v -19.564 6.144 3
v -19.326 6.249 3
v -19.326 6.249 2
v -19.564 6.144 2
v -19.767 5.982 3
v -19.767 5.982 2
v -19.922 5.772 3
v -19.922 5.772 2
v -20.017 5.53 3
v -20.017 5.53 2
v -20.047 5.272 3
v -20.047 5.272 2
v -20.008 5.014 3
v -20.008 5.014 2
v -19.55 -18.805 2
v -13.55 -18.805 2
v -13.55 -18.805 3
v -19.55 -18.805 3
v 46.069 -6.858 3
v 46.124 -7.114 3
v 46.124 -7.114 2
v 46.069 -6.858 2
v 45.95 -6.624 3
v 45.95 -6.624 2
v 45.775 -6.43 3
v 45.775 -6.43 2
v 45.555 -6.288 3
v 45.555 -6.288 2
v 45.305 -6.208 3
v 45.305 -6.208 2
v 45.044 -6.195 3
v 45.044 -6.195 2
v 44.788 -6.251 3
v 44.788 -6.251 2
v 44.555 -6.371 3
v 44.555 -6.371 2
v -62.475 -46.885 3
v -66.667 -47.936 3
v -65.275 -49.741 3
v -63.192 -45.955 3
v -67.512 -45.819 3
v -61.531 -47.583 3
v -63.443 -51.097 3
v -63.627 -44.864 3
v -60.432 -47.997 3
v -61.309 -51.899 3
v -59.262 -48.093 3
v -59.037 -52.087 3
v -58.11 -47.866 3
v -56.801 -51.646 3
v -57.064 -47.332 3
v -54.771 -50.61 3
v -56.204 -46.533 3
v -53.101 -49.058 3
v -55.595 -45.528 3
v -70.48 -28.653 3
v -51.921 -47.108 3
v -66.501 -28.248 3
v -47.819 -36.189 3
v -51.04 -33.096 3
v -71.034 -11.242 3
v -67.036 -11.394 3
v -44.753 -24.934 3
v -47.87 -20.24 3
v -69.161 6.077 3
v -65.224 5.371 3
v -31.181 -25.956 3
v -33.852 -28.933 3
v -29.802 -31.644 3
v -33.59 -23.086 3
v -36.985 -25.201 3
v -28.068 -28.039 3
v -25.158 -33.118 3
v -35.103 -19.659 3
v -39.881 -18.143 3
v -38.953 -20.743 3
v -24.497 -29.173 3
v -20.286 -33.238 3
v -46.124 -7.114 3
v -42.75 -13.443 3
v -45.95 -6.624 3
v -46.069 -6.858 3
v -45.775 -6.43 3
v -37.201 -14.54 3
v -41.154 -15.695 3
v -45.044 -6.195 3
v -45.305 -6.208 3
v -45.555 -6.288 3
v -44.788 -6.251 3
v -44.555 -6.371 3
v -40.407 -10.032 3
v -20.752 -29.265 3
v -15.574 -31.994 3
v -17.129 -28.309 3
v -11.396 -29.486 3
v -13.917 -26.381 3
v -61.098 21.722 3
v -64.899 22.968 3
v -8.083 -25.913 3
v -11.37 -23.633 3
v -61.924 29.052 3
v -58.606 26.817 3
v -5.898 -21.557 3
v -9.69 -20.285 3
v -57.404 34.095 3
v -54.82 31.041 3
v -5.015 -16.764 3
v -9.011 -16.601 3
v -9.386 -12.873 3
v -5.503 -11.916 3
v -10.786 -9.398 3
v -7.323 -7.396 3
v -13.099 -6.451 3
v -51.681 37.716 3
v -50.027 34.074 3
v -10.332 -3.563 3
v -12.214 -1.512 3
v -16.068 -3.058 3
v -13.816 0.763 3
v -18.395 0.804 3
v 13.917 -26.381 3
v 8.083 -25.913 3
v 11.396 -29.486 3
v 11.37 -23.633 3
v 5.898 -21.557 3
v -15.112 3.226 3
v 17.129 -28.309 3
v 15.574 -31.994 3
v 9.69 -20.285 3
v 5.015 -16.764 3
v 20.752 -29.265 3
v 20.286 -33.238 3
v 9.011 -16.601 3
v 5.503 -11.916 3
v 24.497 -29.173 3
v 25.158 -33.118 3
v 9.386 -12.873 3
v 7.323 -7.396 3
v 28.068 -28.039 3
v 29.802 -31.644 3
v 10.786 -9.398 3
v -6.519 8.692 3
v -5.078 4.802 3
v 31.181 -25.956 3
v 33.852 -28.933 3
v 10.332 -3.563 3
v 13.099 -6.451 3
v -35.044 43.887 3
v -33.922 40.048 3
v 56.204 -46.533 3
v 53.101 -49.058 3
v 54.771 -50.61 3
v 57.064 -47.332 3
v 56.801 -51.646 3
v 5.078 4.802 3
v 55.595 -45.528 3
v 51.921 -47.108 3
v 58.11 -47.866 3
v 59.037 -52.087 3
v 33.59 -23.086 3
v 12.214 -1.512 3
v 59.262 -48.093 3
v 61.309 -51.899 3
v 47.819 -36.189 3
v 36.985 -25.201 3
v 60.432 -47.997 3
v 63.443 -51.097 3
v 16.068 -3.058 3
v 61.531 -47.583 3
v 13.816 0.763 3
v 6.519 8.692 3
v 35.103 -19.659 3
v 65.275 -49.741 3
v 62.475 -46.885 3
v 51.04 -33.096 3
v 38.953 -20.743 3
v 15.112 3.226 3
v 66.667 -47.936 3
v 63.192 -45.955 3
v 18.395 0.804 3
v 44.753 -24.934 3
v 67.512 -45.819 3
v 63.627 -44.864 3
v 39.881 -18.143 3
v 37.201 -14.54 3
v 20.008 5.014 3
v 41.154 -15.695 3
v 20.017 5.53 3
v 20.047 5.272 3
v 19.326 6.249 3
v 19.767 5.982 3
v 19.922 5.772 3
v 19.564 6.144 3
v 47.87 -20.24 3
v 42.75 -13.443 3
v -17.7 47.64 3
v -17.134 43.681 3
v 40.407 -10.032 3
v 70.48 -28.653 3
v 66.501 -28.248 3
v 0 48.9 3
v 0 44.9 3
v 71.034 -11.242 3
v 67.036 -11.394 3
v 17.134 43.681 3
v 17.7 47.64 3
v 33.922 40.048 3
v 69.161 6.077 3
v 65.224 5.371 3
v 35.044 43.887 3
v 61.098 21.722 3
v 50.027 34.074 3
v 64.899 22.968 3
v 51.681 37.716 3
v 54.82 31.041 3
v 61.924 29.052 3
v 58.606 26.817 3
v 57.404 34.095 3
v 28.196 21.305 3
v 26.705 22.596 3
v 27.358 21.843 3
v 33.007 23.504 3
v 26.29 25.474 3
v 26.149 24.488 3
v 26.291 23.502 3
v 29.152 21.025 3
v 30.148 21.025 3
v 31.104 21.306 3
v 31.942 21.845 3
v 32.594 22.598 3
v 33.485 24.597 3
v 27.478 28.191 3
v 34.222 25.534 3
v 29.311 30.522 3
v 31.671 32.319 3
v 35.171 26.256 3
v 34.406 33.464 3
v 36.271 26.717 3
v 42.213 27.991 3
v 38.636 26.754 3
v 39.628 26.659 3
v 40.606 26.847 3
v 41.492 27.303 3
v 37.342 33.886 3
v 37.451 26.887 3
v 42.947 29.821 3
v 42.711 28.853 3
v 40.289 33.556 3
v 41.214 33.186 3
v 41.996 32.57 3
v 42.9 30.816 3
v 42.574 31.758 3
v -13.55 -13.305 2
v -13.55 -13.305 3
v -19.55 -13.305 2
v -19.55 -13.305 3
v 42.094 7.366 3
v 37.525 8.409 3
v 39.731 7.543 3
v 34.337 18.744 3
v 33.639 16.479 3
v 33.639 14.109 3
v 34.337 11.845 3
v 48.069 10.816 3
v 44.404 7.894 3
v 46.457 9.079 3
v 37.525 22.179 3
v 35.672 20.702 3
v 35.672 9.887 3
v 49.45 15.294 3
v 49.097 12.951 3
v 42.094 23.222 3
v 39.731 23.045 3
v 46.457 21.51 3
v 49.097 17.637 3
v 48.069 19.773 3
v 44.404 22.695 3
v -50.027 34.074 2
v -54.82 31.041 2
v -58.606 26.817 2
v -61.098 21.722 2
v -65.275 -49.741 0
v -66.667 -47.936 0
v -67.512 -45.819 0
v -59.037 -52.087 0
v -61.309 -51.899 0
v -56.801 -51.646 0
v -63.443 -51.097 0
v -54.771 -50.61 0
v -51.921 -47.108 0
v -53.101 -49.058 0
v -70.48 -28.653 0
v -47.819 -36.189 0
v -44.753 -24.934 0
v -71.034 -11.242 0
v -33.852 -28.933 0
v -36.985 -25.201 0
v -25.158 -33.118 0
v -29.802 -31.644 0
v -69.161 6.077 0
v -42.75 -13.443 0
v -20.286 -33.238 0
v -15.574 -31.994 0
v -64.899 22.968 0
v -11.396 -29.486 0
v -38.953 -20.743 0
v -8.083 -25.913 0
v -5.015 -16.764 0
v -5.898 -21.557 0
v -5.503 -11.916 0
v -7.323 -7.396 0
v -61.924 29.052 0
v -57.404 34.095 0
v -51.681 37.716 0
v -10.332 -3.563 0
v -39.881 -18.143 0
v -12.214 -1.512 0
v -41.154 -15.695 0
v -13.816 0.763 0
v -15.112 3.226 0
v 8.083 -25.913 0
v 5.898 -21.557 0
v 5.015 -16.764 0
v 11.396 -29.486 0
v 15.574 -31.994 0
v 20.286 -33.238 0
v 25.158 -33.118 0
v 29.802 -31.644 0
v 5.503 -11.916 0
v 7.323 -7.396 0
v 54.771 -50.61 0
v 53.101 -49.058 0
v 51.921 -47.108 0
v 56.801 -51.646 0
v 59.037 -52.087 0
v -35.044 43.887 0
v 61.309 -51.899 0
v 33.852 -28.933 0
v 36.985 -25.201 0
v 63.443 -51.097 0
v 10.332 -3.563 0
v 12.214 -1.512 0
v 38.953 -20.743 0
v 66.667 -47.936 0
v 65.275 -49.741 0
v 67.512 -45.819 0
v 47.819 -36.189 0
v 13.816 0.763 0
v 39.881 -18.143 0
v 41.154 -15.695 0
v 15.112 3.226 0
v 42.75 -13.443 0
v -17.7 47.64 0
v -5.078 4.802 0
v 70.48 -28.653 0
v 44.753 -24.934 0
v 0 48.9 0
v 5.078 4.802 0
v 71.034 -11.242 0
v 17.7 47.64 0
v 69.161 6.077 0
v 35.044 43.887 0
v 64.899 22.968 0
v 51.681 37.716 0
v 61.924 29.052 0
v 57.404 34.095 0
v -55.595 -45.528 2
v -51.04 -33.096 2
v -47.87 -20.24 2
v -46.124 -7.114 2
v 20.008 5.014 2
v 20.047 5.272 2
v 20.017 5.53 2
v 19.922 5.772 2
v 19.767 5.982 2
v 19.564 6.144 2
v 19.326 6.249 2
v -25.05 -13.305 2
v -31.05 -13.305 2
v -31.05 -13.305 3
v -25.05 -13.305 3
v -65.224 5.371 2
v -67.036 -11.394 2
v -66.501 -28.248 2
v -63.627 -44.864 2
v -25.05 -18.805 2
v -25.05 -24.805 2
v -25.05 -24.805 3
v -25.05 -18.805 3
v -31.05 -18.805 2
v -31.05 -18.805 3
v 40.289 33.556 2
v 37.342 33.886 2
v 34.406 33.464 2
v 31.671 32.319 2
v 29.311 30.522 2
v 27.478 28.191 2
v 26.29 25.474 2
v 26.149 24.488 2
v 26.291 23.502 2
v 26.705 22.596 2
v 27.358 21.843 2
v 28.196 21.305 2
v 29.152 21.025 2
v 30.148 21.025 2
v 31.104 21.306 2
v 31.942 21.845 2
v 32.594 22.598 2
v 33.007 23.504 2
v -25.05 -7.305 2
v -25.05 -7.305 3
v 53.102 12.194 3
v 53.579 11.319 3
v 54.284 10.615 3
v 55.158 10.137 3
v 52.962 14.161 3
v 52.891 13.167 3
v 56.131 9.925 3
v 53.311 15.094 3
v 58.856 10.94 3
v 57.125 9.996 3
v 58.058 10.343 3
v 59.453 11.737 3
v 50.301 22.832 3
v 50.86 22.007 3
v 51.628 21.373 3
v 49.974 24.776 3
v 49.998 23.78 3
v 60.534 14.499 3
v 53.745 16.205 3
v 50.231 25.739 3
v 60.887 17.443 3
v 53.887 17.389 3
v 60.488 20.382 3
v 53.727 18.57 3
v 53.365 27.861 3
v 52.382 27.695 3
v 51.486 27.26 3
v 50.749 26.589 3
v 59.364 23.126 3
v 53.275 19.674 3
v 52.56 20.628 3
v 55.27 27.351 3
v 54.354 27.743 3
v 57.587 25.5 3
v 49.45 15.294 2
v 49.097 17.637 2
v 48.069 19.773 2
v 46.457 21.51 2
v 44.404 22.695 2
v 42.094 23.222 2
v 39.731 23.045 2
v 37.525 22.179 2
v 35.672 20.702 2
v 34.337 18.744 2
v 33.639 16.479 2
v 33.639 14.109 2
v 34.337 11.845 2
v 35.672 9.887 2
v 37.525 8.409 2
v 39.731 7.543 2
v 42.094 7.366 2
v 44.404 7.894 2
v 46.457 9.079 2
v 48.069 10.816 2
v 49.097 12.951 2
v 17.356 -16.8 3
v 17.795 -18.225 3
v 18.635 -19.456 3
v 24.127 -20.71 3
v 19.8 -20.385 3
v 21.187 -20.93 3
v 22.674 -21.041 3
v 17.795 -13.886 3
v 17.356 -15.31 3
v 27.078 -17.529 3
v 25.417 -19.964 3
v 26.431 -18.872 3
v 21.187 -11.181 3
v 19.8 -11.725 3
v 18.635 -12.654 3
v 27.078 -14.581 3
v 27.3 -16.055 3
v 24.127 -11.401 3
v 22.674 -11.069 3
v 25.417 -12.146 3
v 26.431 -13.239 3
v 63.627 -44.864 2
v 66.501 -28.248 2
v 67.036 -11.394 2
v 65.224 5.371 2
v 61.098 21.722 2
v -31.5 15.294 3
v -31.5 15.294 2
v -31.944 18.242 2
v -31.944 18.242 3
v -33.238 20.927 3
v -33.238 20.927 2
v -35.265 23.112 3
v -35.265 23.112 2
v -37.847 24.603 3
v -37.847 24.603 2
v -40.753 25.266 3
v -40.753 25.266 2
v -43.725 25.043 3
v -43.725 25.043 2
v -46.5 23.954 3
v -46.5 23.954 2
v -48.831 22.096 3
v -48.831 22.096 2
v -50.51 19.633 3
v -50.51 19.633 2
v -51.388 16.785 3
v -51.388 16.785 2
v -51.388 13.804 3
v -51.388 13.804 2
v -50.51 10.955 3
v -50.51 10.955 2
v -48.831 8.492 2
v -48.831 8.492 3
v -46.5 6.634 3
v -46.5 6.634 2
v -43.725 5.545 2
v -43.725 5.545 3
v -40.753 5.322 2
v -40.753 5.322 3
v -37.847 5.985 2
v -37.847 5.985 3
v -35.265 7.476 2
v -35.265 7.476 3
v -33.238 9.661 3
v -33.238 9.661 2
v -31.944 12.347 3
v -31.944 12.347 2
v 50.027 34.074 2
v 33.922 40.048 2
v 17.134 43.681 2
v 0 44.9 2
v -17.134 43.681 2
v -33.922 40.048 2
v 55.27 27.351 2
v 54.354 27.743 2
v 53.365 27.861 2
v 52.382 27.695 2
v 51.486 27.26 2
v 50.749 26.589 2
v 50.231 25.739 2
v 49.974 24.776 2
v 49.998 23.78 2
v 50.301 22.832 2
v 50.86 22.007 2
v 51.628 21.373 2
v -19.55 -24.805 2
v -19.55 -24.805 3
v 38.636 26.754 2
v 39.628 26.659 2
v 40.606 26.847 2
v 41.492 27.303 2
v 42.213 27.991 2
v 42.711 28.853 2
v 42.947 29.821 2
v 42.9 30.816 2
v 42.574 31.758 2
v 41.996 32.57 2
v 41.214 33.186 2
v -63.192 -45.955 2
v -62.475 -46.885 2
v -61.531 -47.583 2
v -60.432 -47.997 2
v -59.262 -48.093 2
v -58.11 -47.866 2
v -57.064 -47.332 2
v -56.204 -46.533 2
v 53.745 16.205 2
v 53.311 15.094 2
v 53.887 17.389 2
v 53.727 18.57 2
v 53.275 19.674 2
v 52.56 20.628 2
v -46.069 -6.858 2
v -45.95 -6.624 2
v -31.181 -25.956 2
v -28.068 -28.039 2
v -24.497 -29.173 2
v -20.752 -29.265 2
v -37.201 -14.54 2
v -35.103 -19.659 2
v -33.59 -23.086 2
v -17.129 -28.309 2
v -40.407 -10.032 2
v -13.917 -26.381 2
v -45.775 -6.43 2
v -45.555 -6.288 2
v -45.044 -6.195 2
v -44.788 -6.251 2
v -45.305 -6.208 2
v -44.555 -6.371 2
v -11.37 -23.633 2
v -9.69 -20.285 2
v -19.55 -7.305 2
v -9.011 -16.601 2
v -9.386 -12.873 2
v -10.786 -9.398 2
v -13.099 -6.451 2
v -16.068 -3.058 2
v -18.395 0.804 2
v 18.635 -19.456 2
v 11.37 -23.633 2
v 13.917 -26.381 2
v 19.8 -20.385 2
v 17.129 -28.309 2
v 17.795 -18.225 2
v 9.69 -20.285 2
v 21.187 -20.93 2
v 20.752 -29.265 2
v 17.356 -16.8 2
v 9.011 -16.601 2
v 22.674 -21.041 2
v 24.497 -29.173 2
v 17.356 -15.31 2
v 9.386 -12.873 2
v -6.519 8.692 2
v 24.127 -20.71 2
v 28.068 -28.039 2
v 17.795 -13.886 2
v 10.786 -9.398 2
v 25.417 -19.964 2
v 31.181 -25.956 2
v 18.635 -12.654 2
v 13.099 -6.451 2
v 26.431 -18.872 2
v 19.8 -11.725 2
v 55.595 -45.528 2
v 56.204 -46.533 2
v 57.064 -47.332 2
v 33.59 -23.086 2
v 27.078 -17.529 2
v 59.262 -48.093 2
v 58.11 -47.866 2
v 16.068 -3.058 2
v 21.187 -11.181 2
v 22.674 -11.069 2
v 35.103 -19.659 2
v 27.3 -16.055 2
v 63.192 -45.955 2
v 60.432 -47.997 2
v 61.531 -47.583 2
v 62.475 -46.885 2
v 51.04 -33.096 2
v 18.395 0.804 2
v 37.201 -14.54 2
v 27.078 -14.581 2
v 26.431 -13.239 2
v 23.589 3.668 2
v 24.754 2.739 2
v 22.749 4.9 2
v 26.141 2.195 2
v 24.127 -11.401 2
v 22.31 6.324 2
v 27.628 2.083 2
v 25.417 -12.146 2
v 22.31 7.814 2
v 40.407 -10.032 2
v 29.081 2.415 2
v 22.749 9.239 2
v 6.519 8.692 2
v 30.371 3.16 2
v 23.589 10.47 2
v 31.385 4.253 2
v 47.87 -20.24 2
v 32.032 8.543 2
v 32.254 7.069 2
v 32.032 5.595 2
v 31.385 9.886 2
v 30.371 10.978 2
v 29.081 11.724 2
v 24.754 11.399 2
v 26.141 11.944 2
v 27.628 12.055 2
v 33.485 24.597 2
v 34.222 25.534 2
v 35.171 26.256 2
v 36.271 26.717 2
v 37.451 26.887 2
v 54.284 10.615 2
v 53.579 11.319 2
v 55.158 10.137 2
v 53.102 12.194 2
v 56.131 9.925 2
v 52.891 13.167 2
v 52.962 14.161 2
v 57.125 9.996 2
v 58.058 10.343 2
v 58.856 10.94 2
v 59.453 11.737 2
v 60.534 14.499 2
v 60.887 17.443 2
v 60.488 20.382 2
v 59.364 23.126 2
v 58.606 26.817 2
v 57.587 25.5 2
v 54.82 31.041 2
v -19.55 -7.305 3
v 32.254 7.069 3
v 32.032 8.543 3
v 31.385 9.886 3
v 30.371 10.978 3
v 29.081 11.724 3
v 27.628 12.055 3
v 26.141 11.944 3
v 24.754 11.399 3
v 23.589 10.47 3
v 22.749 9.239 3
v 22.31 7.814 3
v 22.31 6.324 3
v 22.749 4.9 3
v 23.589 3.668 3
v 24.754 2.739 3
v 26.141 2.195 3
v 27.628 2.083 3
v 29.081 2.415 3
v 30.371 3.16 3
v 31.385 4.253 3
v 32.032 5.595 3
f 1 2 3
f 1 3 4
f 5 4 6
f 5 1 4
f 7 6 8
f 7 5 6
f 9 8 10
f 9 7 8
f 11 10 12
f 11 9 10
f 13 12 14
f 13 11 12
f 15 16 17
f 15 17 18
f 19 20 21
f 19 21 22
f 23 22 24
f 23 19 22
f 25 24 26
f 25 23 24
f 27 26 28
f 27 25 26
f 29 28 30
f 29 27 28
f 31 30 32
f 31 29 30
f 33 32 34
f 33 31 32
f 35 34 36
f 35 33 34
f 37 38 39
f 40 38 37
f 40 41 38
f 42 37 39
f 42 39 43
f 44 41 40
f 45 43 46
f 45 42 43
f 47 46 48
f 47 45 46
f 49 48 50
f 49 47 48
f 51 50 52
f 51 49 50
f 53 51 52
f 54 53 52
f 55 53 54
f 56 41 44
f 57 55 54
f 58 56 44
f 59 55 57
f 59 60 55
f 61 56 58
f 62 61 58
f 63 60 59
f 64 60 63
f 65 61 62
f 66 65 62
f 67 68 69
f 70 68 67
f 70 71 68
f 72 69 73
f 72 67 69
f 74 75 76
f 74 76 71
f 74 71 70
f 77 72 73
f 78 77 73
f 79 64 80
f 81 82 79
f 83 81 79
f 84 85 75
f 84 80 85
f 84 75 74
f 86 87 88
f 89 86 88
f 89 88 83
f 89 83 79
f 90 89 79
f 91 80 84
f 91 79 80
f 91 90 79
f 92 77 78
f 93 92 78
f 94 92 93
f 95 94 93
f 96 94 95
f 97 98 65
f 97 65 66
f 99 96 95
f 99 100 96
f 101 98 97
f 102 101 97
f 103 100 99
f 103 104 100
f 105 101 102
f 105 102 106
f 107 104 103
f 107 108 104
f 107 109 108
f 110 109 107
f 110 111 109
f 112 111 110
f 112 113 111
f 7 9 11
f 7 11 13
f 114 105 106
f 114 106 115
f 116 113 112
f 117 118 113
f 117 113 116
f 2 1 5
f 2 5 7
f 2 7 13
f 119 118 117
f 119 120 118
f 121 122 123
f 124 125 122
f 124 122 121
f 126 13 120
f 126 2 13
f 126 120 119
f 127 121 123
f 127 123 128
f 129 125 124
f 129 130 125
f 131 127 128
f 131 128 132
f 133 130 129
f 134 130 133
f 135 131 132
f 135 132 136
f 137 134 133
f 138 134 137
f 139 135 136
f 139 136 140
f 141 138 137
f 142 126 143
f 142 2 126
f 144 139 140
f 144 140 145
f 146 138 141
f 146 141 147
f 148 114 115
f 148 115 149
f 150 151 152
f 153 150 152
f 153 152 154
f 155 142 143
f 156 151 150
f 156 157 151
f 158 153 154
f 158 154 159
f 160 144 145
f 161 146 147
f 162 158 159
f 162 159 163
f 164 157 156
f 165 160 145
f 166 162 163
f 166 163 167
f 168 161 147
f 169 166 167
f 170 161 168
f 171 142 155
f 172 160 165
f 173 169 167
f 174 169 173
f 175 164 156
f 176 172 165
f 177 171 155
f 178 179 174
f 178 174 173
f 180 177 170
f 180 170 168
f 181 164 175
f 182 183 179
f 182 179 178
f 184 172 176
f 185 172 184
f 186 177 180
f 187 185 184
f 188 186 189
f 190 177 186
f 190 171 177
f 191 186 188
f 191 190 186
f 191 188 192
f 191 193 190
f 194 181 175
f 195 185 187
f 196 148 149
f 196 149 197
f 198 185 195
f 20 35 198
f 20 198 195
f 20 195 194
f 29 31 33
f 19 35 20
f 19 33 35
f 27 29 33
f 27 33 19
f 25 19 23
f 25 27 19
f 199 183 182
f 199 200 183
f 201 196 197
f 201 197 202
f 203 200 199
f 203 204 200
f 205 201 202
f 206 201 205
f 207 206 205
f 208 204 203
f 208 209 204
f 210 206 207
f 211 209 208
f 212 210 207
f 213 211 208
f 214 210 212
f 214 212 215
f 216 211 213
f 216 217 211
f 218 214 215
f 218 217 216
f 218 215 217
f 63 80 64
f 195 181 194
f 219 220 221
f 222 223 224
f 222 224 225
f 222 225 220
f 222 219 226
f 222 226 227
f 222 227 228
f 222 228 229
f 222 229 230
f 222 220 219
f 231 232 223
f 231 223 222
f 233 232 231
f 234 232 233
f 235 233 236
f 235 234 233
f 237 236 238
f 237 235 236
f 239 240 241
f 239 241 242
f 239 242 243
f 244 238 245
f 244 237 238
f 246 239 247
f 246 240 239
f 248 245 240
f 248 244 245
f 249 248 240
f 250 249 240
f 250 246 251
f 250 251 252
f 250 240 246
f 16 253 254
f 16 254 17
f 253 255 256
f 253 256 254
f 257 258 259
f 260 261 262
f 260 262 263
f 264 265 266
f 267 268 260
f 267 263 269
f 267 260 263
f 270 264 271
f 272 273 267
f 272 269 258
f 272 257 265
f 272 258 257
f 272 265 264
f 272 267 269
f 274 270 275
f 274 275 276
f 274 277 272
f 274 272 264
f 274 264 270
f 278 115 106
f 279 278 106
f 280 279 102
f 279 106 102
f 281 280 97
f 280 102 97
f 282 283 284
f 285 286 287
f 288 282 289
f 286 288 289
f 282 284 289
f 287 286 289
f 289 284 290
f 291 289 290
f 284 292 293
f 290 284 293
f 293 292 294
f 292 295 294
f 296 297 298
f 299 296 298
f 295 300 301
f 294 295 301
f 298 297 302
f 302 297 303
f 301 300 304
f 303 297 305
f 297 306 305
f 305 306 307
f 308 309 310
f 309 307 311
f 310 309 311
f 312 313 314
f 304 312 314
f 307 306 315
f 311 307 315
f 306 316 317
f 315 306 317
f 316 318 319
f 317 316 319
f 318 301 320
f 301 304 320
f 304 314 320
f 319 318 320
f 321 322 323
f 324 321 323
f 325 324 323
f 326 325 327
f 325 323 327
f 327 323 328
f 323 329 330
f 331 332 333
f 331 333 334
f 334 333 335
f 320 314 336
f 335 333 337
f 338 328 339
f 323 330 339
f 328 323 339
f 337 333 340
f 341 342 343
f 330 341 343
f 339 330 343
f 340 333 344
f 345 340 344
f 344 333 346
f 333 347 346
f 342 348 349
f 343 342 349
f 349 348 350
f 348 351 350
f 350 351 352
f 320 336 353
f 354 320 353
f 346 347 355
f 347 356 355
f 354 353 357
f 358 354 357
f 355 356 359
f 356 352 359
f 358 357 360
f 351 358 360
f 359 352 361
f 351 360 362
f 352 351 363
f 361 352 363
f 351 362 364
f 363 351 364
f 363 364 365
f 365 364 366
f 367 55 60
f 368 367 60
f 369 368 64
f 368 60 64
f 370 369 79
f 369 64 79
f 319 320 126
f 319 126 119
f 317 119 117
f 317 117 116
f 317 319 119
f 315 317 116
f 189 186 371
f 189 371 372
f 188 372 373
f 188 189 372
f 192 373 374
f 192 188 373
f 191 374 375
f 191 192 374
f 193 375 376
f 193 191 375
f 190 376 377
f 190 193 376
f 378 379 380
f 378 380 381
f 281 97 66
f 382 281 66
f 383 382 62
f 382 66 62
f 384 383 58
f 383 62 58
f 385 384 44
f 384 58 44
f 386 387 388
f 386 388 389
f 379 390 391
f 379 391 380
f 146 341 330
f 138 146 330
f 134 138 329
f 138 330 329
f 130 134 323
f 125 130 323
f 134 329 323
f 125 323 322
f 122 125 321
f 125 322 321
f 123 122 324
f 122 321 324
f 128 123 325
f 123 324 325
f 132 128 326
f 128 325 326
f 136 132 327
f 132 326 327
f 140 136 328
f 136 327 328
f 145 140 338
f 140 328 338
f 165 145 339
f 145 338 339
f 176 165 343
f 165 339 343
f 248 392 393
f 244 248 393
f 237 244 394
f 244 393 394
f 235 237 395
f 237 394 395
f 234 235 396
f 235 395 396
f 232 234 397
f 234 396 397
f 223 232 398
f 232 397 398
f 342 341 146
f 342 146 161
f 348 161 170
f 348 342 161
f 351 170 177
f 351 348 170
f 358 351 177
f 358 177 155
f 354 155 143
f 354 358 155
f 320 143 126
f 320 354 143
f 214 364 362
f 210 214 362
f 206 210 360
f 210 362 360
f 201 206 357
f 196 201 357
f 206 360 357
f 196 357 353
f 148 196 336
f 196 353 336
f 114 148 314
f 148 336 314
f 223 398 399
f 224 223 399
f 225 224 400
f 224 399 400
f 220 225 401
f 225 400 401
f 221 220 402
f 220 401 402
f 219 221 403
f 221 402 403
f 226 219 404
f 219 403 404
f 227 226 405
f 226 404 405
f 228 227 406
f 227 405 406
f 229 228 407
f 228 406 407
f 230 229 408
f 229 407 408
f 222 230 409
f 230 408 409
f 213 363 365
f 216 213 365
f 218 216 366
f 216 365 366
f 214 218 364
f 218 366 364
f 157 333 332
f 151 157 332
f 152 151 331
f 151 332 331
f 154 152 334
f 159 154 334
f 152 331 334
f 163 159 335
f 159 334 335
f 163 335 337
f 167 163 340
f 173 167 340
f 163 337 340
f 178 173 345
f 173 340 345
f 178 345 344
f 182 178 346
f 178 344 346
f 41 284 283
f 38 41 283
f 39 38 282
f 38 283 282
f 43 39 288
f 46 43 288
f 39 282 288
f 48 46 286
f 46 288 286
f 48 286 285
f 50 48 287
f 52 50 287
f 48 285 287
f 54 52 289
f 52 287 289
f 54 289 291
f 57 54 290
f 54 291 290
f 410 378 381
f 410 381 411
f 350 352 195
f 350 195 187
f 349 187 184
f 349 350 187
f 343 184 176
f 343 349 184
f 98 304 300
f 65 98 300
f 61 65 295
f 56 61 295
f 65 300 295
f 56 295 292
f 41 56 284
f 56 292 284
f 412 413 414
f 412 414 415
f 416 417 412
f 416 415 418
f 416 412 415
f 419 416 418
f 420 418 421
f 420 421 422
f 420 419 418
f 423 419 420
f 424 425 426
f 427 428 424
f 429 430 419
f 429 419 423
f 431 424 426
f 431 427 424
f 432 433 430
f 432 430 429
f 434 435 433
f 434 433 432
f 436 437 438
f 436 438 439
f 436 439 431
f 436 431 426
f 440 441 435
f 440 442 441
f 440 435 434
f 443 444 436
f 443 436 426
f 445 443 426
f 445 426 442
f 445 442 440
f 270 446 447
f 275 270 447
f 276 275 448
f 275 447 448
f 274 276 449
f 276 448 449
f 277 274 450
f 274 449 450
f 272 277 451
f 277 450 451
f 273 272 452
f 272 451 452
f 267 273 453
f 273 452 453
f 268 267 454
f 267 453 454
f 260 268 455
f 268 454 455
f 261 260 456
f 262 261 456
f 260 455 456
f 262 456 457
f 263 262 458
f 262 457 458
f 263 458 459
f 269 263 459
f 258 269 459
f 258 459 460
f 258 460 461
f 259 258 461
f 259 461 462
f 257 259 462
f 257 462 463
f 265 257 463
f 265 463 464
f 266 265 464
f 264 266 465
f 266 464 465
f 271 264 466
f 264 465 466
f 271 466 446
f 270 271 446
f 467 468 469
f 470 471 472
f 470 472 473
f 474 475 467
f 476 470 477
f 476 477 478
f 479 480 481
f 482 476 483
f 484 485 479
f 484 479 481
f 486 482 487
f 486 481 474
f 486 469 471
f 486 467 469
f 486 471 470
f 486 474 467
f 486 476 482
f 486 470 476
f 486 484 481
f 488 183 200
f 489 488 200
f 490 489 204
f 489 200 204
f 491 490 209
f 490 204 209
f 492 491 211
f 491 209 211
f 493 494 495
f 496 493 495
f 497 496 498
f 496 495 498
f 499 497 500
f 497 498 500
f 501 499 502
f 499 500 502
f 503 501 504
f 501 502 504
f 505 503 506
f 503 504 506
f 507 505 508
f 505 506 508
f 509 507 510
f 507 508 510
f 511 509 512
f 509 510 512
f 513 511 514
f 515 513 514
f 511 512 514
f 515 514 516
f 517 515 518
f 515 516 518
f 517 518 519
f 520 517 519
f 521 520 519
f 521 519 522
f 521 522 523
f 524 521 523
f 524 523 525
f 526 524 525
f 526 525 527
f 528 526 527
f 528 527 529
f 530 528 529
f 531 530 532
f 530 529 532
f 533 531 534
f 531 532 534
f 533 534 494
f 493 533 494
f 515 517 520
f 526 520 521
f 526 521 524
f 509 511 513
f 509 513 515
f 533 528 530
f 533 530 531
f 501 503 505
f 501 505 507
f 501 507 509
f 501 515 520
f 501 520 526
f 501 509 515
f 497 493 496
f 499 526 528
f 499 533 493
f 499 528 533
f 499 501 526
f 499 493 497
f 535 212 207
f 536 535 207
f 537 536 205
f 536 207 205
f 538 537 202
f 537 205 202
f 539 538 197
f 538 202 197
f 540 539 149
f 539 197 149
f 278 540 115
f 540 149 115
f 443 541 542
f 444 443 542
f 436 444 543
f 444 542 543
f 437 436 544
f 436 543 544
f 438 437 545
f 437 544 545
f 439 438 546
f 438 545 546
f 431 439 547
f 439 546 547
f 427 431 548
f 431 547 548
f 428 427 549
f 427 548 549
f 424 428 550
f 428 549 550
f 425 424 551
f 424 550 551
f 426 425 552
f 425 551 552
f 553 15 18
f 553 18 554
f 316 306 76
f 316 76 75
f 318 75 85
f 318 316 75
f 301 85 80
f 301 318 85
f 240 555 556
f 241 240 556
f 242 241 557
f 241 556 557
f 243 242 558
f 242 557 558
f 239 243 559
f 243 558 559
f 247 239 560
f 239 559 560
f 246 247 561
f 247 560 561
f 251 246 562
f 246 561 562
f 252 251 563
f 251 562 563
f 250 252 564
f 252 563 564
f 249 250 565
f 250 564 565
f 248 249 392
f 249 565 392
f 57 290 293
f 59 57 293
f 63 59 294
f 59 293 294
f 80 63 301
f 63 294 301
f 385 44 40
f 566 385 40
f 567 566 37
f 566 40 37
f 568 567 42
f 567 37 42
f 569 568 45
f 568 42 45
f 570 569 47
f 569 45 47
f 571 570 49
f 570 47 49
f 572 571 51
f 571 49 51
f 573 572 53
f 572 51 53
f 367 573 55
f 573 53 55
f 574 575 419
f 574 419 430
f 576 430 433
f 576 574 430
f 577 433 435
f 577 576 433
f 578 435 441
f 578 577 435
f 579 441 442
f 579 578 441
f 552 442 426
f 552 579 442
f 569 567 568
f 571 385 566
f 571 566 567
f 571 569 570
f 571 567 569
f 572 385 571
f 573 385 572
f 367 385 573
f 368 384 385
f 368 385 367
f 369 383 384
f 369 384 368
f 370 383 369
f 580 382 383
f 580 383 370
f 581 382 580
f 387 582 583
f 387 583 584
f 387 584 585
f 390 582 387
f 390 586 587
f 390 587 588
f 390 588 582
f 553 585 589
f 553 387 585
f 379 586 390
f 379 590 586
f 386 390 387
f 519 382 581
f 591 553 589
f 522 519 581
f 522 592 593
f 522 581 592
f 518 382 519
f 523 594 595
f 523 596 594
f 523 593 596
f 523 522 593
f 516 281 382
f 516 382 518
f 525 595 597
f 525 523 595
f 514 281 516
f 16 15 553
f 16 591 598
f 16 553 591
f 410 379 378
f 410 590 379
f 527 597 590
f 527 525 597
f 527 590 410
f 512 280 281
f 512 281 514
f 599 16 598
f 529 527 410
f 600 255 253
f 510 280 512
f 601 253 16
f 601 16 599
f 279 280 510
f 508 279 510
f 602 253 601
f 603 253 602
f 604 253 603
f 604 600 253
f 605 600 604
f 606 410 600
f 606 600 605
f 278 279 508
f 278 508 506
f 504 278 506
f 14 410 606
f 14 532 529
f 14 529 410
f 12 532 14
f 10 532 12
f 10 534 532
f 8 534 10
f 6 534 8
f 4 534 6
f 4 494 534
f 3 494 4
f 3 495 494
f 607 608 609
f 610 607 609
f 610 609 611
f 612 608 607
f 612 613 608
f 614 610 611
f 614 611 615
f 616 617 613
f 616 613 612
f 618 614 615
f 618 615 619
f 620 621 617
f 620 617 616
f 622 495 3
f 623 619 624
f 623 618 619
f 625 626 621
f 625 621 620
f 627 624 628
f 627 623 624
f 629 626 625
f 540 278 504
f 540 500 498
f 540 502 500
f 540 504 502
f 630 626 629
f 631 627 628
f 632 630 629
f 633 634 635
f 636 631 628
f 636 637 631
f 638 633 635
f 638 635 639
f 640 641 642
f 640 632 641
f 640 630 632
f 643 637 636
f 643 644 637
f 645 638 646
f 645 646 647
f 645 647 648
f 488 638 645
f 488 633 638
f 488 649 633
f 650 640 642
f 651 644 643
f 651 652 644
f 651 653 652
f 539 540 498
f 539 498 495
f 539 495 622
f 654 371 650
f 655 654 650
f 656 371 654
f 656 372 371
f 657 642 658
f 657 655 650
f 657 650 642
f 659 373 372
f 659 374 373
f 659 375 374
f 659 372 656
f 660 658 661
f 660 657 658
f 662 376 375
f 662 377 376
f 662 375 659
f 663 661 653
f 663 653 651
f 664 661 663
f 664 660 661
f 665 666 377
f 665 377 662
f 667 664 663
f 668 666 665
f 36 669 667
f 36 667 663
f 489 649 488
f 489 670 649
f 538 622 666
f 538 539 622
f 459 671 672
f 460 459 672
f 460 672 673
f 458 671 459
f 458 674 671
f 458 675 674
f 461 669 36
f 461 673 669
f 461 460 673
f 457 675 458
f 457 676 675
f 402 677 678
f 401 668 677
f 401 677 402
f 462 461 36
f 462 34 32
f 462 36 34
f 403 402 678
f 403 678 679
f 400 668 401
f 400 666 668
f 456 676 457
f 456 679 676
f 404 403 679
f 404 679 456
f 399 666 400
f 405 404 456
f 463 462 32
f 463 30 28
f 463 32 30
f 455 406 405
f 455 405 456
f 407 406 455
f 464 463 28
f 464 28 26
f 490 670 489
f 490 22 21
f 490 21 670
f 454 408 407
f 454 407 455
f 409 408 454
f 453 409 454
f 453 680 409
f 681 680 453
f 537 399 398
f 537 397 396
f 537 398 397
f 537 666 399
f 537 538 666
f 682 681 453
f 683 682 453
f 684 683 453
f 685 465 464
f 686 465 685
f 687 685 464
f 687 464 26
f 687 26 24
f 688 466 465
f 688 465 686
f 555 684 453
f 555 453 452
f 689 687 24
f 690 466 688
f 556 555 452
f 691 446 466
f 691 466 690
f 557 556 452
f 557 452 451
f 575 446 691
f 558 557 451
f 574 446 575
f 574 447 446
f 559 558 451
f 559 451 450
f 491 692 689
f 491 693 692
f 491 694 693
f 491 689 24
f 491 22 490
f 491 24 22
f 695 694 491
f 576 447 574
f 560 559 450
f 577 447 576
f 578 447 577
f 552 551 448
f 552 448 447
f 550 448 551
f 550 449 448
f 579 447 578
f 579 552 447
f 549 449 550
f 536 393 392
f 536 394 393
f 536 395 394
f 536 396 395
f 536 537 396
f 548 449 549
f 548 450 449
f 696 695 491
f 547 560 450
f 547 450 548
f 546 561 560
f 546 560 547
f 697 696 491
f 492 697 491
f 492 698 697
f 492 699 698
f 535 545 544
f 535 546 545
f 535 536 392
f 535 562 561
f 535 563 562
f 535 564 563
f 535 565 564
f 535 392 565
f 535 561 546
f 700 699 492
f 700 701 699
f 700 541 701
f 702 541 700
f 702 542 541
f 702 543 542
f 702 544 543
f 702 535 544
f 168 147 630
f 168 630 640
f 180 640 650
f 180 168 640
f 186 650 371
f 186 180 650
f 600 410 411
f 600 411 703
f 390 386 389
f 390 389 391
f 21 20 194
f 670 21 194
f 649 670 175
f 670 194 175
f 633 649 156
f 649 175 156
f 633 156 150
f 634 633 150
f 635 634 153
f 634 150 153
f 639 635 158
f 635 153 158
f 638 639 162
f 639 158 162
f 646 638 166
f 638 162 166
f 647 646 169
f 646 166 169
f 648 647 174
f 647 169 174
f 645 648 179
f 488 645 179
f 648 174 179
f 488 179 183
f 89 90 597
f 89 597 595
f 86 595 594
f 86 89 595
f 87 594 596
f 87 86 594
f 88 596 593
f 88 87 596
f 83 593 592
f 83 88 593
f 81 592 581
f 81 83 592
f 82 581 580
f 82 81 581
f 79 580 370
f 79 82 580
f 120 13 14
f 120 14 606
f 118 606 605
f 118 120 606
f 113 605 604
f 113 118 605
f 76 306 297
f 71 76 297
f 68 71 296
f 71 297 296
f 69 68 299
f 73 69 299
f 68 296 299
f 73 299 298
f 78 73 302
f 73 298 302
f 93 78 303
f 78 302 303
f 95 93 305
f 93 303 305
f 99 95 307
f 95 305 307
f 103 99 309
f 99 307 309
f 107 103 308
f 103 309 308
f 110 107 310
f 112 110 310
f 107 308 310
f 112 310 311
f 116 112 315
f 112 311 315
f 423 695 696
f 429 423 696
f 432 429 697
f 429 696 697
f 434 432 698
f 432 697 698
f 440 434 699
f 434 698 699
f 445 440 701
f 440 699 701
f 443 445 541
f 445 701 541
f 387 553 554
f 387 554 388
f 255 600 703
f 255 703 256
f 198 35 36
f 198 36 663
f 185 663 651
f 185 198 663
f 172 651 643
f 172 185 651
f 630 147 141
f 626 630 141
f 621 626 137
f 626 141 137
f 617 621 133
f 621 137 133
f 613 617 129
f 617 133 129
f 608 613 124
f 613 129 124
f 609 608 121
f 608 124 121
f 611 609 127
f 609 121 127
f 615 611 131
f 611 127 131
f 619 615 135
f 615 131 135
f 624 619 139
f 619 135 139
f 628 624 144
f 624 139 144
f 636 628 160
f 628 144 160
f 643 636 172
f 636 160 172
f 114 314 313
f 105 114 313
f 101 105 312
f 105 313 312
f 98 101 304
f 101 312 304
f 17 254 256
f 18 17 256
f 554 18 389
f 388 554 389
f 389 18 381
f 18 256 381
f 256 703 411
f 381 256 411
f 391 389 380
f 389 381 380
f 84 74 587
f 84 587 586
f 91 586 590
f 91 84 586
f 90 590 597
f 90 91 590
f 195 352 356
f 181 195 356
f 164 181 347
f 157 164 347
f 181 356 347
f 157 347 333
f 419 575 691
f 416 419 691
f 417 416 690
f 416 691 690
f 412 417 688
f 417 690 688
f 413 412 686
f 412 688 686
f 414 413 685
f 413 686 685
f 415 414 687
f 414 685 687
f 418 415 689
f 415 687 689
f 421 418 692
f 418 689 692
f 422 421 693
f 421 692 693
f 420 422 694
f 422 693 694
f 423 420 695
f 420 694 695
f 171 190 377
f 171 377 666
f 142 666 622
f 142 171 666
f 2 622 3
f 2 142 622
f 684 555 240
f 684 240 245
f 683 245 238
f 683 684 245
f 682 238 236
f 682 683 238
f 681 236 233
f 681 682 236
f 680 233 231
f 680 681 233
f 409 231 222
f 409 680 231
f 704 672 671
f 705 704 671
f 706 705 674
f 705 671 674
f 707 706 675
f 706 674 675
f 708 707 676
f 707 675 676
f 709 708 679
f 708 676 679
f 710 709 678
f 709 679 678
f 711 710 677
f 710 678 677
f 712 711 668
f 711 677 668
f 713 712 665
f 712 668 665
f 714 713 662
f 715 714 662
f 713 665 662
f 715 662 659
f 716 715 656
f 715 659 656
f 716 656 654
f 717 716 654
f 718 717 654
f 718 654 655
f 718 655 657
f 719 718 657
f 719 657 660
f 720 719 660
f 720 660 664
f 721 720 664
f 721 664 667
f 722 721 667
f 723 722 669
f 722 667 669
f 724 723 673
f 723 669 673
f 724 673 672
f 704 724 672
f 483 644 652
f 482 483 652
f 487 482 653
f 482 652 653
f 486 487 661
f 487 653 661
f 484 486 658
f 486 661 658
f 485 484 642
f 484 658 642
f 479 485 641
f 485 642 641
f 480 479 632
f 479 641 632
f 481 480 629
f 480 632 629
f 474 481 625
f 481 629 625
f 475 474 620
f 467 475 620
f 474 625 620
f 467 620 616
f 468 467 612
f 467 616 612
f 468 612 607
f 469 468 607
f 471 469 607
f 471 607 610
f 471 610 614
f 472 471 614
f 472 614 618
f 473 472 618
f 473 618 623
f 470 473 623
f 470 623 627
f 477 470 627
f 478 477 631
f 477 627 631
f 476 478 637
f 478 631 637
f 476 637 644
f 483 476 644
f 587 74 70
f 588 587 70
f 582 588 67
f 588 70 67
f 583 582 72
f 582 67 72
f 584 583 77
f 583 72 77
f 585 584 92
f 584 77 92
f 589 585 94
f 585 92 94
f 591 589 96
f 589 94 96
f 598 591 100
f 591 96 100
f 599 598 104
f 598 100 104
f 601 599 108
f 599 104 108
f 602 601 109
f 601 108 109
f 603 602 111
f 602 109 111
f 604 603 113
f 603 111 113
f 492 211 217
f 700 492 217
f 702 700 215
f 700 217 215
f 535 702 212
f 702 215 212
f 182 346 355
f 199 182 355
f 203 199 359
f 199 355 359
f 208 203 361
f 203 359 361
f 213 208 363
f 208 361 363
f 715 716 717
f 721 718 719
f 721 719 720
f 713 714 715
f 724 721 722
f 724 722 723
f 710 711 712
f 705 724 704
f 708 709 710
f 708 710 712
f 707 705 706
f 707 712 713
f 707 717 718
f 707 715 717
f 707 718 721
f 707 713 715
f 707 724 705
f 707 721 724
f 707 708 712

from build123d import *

# Parameters (mm, degrees)
PAD_DEPTH     = 3
POCKET_DEPTH  = 1
SKETCH002_R   = 7.95
SKETCH002_R_2 = 10
SKETCH002_R_3 = 5
PAD001_DEPTH  = 1


with BuildPart() as part:
    # Sketch → Pad (new body)
    with BuildSketch(Plane.XY):
        with BuildLine():
            ThreePointArc((51.681196, 37.715878), (0, 48.9), (-51.681196, 37.715878))
            ThreePointArc((-51.681196, 37.715878), (-59.837802, 31.729345), (-64.898683, 22.968279))
            ThreePointArc((-64.898683, 22.968279), (-71.033558, -11.241914), (-67.511606, -45.818928))
            ThreePointArc((-67.511606, -45.818928), (-60.179833, -52.071942), (-51.92059, -47.108074))
            ThreePointArc((-51.92059, -47.108074), (-46.154899, -30.597197), (-42.75, -13.44322))
            ThreePointArc((-38.952909, -20.742528), (-40.475487, -16.897296), (-42.75, -13.44322))
            ThreePointArc((-38.952909, -20.742528), (-13.396354, -30.88815), (-10.33233, -3.562651))
            ThreePointArc((-15.112075, 3.225883), (-13.051436, -0.400195), (-10.33233, -3.562651))
            ThreePointArc((15.112075, 3.225883), (0, 5), (-15.112075, 3.225883))
            ThreePointArc((10.33233, -3.562652), (13.051436, -0.400195), (15.112075, 3.225883))
            ThreePointArc((10.33233, -3.562652), (13.396355, -30.88815), (38.952909, -20.742528))
            ThreePointArc((42.75, -13.44322), (40.475487, -16.897296), (38.952909, -20.742528))
            ThreePointArc((42.75, -13.44322), (46.154899, -30.597197), (51.92059, -47.108074))
            ThreePointArc((51.92059, -47.108074), (60.179833, -52.071942), (67.511606, -45.818928))
            ThreePointArc((67.511606, -45.818928), (71.033558, -11.241914), (64.898683, 22.968279))
            ThreePointArc((64.898683, 22.968279), (59.837802, 31.729345), (51.681196, 37.715878))
        make_face()
    extrude(amount=PAD_DEPTH)

    # Sketch001 (on Face18 of Pad) → Pocket (cut)
    with BuildSketch(Plane.XY.offset(3)):
        with BuildLine():
            ThreePointArc((-50.027397, 34.07377), (-56.859073, 29.059669), (-61.097882, 21.72172))
            ThreePointArc((-61.097882, 21.72172), (-67.036441, -11.393747), (-63.627191, -44.864296))
            ThreePointArc((-63.627191, -44.864296), (-59.850217, -48.085546), (-55.595456, -45.528402))
            ThreePointArc((-55.595456, -45.528402), (-49.278768, -26.711037), (-46.123539, -7.114141))
            ThreePointArc((-44.554869, -6.371105), (-45.55462, -6.287844), (-46.123539, -7.114141))
            ThreePointArc((-35.102525, -19.658763), (-38.674758, -12.194065), (-44.554869, -6.371105))
            ThreePointArc((-35.102525, -19.658763), (-15.455001, -27.458576), (-13.099421, -6.451112))
            ThreePointArc((-20.008465, 5.014144), (-17.316595, -1.178063), (-13.099421, -6.451112))
            ThreePointArc((-19.325882, 6.248668), (-19.921945, 5.772272), (-20.008465, 5.014144))
            ThreePointArc((19.325882, 6.248667), (0, 9), (-19.325882, 6.248668))
            ThreePointArc((20.008465, 5.014144), (19.921946, 5.772272), (19.325882, 6.248667))
            ThreePointArc((13.099421, -6.451112), (17.316595, -1.178063), (20.008465, 5.014144))
            ThreePointArc((13.099421, -6.451112), (15.455001, -27.458576), (35.102525, -19.658763))
            ThreePointArc((44.554869, -6.371105), (38.674758, -12.194065), (35.102525, -19.658763))
            ThreePointArc((46.123539, -7.114141), (45.55462, -6.287844), (44.554869, -6.371105))
            ThreePointArc((46.123539, -7.114141), (49.278768, -26.711037), (55.595456, -45.528402))
            ThreePointArc((55.595456, -45.528402), (59.850217, -48.085546), (63.627191, -44.864296))
            ThreePointArc((63.627191, -44.864296), (67.036441, -11.393747), (61.097882, 21.72172))
            ThreePointArc((61.097882, 21.72172), (56.859073, 29.059669), (50.027397, 34.07377))
            ThreePointArc((50.027397, 34.07377), (0, 44.9), (-50.027397, 34.07377))
        make_face()
    extrude(amount=-POCKET_DEPTH, mode=Mode.SUBTRACT)

    # Sketch002 (on Face39 of Pocket) → Pad001 (join)
    with BuildSketch(Plane.XY.offset(2)):
        with Locations((41.5, 15.29415)):
            Circle(SKETCH002_R)
        with Locations((-41.5, 15.29415)):
            Circle(SKETCH002_R_2)
        with Locations((27.253882, 7.06915)):
            Circle(SKETCH002_R_3)
        with Locations((22.3, -16.055244)):
            Circle(SKETCH002_R_3)
        with BuildLine():
            ThreePointArc((55.269663, 27.35096), (50.459805, 26.182512), (51.628253, 21.372655))
            ThreePointArc((53.310577, 15.094137), (53.726752, 18.570298), (51.628253, 21.372655))
            ThreePointArc((53.310577, 15.094137), (54.7036, 10.344454), (59.453283, 11.737477))
            ThreePointArc((59.453283, 11.737477), (60.488233, 20.382032), (55.269663, 27.35096))
        make_face()
        with BuildLine():
            ThreePointArc((26.290165, 25.474091), (28.663681, 21.130541), (33.007231, 23.504058))
            ThreePointArc((38.636396, 26.754058), (35.170967, 26.256356), (33.007231, 23.504058))
            ThreePointArc((38.636396, 26.754058), (42.863696, 29.328924), (40.28883, 33.556224))
            ThreePointArc((40.28883, 33.556224), (31.670967, 32.318534), (26.290165, 25.474091))
        make_face()
        Polygon((-25.05, -13.305244), (-25.05, -7.305244), (-19.55, -7.305244), (-19.55, -13.305244), (-13.55, -13.305244), (-13.55, -18.805244), (-19.55, -18.805244), (-19.55, -24.805244), (-25.05, -24.805244), (-25.05, -18.805244), (-31.05, -18.805244), (-31.05, -13.305244), align=None)
    extrude(amount=PAD001_DEPTH)


solid = part.part
